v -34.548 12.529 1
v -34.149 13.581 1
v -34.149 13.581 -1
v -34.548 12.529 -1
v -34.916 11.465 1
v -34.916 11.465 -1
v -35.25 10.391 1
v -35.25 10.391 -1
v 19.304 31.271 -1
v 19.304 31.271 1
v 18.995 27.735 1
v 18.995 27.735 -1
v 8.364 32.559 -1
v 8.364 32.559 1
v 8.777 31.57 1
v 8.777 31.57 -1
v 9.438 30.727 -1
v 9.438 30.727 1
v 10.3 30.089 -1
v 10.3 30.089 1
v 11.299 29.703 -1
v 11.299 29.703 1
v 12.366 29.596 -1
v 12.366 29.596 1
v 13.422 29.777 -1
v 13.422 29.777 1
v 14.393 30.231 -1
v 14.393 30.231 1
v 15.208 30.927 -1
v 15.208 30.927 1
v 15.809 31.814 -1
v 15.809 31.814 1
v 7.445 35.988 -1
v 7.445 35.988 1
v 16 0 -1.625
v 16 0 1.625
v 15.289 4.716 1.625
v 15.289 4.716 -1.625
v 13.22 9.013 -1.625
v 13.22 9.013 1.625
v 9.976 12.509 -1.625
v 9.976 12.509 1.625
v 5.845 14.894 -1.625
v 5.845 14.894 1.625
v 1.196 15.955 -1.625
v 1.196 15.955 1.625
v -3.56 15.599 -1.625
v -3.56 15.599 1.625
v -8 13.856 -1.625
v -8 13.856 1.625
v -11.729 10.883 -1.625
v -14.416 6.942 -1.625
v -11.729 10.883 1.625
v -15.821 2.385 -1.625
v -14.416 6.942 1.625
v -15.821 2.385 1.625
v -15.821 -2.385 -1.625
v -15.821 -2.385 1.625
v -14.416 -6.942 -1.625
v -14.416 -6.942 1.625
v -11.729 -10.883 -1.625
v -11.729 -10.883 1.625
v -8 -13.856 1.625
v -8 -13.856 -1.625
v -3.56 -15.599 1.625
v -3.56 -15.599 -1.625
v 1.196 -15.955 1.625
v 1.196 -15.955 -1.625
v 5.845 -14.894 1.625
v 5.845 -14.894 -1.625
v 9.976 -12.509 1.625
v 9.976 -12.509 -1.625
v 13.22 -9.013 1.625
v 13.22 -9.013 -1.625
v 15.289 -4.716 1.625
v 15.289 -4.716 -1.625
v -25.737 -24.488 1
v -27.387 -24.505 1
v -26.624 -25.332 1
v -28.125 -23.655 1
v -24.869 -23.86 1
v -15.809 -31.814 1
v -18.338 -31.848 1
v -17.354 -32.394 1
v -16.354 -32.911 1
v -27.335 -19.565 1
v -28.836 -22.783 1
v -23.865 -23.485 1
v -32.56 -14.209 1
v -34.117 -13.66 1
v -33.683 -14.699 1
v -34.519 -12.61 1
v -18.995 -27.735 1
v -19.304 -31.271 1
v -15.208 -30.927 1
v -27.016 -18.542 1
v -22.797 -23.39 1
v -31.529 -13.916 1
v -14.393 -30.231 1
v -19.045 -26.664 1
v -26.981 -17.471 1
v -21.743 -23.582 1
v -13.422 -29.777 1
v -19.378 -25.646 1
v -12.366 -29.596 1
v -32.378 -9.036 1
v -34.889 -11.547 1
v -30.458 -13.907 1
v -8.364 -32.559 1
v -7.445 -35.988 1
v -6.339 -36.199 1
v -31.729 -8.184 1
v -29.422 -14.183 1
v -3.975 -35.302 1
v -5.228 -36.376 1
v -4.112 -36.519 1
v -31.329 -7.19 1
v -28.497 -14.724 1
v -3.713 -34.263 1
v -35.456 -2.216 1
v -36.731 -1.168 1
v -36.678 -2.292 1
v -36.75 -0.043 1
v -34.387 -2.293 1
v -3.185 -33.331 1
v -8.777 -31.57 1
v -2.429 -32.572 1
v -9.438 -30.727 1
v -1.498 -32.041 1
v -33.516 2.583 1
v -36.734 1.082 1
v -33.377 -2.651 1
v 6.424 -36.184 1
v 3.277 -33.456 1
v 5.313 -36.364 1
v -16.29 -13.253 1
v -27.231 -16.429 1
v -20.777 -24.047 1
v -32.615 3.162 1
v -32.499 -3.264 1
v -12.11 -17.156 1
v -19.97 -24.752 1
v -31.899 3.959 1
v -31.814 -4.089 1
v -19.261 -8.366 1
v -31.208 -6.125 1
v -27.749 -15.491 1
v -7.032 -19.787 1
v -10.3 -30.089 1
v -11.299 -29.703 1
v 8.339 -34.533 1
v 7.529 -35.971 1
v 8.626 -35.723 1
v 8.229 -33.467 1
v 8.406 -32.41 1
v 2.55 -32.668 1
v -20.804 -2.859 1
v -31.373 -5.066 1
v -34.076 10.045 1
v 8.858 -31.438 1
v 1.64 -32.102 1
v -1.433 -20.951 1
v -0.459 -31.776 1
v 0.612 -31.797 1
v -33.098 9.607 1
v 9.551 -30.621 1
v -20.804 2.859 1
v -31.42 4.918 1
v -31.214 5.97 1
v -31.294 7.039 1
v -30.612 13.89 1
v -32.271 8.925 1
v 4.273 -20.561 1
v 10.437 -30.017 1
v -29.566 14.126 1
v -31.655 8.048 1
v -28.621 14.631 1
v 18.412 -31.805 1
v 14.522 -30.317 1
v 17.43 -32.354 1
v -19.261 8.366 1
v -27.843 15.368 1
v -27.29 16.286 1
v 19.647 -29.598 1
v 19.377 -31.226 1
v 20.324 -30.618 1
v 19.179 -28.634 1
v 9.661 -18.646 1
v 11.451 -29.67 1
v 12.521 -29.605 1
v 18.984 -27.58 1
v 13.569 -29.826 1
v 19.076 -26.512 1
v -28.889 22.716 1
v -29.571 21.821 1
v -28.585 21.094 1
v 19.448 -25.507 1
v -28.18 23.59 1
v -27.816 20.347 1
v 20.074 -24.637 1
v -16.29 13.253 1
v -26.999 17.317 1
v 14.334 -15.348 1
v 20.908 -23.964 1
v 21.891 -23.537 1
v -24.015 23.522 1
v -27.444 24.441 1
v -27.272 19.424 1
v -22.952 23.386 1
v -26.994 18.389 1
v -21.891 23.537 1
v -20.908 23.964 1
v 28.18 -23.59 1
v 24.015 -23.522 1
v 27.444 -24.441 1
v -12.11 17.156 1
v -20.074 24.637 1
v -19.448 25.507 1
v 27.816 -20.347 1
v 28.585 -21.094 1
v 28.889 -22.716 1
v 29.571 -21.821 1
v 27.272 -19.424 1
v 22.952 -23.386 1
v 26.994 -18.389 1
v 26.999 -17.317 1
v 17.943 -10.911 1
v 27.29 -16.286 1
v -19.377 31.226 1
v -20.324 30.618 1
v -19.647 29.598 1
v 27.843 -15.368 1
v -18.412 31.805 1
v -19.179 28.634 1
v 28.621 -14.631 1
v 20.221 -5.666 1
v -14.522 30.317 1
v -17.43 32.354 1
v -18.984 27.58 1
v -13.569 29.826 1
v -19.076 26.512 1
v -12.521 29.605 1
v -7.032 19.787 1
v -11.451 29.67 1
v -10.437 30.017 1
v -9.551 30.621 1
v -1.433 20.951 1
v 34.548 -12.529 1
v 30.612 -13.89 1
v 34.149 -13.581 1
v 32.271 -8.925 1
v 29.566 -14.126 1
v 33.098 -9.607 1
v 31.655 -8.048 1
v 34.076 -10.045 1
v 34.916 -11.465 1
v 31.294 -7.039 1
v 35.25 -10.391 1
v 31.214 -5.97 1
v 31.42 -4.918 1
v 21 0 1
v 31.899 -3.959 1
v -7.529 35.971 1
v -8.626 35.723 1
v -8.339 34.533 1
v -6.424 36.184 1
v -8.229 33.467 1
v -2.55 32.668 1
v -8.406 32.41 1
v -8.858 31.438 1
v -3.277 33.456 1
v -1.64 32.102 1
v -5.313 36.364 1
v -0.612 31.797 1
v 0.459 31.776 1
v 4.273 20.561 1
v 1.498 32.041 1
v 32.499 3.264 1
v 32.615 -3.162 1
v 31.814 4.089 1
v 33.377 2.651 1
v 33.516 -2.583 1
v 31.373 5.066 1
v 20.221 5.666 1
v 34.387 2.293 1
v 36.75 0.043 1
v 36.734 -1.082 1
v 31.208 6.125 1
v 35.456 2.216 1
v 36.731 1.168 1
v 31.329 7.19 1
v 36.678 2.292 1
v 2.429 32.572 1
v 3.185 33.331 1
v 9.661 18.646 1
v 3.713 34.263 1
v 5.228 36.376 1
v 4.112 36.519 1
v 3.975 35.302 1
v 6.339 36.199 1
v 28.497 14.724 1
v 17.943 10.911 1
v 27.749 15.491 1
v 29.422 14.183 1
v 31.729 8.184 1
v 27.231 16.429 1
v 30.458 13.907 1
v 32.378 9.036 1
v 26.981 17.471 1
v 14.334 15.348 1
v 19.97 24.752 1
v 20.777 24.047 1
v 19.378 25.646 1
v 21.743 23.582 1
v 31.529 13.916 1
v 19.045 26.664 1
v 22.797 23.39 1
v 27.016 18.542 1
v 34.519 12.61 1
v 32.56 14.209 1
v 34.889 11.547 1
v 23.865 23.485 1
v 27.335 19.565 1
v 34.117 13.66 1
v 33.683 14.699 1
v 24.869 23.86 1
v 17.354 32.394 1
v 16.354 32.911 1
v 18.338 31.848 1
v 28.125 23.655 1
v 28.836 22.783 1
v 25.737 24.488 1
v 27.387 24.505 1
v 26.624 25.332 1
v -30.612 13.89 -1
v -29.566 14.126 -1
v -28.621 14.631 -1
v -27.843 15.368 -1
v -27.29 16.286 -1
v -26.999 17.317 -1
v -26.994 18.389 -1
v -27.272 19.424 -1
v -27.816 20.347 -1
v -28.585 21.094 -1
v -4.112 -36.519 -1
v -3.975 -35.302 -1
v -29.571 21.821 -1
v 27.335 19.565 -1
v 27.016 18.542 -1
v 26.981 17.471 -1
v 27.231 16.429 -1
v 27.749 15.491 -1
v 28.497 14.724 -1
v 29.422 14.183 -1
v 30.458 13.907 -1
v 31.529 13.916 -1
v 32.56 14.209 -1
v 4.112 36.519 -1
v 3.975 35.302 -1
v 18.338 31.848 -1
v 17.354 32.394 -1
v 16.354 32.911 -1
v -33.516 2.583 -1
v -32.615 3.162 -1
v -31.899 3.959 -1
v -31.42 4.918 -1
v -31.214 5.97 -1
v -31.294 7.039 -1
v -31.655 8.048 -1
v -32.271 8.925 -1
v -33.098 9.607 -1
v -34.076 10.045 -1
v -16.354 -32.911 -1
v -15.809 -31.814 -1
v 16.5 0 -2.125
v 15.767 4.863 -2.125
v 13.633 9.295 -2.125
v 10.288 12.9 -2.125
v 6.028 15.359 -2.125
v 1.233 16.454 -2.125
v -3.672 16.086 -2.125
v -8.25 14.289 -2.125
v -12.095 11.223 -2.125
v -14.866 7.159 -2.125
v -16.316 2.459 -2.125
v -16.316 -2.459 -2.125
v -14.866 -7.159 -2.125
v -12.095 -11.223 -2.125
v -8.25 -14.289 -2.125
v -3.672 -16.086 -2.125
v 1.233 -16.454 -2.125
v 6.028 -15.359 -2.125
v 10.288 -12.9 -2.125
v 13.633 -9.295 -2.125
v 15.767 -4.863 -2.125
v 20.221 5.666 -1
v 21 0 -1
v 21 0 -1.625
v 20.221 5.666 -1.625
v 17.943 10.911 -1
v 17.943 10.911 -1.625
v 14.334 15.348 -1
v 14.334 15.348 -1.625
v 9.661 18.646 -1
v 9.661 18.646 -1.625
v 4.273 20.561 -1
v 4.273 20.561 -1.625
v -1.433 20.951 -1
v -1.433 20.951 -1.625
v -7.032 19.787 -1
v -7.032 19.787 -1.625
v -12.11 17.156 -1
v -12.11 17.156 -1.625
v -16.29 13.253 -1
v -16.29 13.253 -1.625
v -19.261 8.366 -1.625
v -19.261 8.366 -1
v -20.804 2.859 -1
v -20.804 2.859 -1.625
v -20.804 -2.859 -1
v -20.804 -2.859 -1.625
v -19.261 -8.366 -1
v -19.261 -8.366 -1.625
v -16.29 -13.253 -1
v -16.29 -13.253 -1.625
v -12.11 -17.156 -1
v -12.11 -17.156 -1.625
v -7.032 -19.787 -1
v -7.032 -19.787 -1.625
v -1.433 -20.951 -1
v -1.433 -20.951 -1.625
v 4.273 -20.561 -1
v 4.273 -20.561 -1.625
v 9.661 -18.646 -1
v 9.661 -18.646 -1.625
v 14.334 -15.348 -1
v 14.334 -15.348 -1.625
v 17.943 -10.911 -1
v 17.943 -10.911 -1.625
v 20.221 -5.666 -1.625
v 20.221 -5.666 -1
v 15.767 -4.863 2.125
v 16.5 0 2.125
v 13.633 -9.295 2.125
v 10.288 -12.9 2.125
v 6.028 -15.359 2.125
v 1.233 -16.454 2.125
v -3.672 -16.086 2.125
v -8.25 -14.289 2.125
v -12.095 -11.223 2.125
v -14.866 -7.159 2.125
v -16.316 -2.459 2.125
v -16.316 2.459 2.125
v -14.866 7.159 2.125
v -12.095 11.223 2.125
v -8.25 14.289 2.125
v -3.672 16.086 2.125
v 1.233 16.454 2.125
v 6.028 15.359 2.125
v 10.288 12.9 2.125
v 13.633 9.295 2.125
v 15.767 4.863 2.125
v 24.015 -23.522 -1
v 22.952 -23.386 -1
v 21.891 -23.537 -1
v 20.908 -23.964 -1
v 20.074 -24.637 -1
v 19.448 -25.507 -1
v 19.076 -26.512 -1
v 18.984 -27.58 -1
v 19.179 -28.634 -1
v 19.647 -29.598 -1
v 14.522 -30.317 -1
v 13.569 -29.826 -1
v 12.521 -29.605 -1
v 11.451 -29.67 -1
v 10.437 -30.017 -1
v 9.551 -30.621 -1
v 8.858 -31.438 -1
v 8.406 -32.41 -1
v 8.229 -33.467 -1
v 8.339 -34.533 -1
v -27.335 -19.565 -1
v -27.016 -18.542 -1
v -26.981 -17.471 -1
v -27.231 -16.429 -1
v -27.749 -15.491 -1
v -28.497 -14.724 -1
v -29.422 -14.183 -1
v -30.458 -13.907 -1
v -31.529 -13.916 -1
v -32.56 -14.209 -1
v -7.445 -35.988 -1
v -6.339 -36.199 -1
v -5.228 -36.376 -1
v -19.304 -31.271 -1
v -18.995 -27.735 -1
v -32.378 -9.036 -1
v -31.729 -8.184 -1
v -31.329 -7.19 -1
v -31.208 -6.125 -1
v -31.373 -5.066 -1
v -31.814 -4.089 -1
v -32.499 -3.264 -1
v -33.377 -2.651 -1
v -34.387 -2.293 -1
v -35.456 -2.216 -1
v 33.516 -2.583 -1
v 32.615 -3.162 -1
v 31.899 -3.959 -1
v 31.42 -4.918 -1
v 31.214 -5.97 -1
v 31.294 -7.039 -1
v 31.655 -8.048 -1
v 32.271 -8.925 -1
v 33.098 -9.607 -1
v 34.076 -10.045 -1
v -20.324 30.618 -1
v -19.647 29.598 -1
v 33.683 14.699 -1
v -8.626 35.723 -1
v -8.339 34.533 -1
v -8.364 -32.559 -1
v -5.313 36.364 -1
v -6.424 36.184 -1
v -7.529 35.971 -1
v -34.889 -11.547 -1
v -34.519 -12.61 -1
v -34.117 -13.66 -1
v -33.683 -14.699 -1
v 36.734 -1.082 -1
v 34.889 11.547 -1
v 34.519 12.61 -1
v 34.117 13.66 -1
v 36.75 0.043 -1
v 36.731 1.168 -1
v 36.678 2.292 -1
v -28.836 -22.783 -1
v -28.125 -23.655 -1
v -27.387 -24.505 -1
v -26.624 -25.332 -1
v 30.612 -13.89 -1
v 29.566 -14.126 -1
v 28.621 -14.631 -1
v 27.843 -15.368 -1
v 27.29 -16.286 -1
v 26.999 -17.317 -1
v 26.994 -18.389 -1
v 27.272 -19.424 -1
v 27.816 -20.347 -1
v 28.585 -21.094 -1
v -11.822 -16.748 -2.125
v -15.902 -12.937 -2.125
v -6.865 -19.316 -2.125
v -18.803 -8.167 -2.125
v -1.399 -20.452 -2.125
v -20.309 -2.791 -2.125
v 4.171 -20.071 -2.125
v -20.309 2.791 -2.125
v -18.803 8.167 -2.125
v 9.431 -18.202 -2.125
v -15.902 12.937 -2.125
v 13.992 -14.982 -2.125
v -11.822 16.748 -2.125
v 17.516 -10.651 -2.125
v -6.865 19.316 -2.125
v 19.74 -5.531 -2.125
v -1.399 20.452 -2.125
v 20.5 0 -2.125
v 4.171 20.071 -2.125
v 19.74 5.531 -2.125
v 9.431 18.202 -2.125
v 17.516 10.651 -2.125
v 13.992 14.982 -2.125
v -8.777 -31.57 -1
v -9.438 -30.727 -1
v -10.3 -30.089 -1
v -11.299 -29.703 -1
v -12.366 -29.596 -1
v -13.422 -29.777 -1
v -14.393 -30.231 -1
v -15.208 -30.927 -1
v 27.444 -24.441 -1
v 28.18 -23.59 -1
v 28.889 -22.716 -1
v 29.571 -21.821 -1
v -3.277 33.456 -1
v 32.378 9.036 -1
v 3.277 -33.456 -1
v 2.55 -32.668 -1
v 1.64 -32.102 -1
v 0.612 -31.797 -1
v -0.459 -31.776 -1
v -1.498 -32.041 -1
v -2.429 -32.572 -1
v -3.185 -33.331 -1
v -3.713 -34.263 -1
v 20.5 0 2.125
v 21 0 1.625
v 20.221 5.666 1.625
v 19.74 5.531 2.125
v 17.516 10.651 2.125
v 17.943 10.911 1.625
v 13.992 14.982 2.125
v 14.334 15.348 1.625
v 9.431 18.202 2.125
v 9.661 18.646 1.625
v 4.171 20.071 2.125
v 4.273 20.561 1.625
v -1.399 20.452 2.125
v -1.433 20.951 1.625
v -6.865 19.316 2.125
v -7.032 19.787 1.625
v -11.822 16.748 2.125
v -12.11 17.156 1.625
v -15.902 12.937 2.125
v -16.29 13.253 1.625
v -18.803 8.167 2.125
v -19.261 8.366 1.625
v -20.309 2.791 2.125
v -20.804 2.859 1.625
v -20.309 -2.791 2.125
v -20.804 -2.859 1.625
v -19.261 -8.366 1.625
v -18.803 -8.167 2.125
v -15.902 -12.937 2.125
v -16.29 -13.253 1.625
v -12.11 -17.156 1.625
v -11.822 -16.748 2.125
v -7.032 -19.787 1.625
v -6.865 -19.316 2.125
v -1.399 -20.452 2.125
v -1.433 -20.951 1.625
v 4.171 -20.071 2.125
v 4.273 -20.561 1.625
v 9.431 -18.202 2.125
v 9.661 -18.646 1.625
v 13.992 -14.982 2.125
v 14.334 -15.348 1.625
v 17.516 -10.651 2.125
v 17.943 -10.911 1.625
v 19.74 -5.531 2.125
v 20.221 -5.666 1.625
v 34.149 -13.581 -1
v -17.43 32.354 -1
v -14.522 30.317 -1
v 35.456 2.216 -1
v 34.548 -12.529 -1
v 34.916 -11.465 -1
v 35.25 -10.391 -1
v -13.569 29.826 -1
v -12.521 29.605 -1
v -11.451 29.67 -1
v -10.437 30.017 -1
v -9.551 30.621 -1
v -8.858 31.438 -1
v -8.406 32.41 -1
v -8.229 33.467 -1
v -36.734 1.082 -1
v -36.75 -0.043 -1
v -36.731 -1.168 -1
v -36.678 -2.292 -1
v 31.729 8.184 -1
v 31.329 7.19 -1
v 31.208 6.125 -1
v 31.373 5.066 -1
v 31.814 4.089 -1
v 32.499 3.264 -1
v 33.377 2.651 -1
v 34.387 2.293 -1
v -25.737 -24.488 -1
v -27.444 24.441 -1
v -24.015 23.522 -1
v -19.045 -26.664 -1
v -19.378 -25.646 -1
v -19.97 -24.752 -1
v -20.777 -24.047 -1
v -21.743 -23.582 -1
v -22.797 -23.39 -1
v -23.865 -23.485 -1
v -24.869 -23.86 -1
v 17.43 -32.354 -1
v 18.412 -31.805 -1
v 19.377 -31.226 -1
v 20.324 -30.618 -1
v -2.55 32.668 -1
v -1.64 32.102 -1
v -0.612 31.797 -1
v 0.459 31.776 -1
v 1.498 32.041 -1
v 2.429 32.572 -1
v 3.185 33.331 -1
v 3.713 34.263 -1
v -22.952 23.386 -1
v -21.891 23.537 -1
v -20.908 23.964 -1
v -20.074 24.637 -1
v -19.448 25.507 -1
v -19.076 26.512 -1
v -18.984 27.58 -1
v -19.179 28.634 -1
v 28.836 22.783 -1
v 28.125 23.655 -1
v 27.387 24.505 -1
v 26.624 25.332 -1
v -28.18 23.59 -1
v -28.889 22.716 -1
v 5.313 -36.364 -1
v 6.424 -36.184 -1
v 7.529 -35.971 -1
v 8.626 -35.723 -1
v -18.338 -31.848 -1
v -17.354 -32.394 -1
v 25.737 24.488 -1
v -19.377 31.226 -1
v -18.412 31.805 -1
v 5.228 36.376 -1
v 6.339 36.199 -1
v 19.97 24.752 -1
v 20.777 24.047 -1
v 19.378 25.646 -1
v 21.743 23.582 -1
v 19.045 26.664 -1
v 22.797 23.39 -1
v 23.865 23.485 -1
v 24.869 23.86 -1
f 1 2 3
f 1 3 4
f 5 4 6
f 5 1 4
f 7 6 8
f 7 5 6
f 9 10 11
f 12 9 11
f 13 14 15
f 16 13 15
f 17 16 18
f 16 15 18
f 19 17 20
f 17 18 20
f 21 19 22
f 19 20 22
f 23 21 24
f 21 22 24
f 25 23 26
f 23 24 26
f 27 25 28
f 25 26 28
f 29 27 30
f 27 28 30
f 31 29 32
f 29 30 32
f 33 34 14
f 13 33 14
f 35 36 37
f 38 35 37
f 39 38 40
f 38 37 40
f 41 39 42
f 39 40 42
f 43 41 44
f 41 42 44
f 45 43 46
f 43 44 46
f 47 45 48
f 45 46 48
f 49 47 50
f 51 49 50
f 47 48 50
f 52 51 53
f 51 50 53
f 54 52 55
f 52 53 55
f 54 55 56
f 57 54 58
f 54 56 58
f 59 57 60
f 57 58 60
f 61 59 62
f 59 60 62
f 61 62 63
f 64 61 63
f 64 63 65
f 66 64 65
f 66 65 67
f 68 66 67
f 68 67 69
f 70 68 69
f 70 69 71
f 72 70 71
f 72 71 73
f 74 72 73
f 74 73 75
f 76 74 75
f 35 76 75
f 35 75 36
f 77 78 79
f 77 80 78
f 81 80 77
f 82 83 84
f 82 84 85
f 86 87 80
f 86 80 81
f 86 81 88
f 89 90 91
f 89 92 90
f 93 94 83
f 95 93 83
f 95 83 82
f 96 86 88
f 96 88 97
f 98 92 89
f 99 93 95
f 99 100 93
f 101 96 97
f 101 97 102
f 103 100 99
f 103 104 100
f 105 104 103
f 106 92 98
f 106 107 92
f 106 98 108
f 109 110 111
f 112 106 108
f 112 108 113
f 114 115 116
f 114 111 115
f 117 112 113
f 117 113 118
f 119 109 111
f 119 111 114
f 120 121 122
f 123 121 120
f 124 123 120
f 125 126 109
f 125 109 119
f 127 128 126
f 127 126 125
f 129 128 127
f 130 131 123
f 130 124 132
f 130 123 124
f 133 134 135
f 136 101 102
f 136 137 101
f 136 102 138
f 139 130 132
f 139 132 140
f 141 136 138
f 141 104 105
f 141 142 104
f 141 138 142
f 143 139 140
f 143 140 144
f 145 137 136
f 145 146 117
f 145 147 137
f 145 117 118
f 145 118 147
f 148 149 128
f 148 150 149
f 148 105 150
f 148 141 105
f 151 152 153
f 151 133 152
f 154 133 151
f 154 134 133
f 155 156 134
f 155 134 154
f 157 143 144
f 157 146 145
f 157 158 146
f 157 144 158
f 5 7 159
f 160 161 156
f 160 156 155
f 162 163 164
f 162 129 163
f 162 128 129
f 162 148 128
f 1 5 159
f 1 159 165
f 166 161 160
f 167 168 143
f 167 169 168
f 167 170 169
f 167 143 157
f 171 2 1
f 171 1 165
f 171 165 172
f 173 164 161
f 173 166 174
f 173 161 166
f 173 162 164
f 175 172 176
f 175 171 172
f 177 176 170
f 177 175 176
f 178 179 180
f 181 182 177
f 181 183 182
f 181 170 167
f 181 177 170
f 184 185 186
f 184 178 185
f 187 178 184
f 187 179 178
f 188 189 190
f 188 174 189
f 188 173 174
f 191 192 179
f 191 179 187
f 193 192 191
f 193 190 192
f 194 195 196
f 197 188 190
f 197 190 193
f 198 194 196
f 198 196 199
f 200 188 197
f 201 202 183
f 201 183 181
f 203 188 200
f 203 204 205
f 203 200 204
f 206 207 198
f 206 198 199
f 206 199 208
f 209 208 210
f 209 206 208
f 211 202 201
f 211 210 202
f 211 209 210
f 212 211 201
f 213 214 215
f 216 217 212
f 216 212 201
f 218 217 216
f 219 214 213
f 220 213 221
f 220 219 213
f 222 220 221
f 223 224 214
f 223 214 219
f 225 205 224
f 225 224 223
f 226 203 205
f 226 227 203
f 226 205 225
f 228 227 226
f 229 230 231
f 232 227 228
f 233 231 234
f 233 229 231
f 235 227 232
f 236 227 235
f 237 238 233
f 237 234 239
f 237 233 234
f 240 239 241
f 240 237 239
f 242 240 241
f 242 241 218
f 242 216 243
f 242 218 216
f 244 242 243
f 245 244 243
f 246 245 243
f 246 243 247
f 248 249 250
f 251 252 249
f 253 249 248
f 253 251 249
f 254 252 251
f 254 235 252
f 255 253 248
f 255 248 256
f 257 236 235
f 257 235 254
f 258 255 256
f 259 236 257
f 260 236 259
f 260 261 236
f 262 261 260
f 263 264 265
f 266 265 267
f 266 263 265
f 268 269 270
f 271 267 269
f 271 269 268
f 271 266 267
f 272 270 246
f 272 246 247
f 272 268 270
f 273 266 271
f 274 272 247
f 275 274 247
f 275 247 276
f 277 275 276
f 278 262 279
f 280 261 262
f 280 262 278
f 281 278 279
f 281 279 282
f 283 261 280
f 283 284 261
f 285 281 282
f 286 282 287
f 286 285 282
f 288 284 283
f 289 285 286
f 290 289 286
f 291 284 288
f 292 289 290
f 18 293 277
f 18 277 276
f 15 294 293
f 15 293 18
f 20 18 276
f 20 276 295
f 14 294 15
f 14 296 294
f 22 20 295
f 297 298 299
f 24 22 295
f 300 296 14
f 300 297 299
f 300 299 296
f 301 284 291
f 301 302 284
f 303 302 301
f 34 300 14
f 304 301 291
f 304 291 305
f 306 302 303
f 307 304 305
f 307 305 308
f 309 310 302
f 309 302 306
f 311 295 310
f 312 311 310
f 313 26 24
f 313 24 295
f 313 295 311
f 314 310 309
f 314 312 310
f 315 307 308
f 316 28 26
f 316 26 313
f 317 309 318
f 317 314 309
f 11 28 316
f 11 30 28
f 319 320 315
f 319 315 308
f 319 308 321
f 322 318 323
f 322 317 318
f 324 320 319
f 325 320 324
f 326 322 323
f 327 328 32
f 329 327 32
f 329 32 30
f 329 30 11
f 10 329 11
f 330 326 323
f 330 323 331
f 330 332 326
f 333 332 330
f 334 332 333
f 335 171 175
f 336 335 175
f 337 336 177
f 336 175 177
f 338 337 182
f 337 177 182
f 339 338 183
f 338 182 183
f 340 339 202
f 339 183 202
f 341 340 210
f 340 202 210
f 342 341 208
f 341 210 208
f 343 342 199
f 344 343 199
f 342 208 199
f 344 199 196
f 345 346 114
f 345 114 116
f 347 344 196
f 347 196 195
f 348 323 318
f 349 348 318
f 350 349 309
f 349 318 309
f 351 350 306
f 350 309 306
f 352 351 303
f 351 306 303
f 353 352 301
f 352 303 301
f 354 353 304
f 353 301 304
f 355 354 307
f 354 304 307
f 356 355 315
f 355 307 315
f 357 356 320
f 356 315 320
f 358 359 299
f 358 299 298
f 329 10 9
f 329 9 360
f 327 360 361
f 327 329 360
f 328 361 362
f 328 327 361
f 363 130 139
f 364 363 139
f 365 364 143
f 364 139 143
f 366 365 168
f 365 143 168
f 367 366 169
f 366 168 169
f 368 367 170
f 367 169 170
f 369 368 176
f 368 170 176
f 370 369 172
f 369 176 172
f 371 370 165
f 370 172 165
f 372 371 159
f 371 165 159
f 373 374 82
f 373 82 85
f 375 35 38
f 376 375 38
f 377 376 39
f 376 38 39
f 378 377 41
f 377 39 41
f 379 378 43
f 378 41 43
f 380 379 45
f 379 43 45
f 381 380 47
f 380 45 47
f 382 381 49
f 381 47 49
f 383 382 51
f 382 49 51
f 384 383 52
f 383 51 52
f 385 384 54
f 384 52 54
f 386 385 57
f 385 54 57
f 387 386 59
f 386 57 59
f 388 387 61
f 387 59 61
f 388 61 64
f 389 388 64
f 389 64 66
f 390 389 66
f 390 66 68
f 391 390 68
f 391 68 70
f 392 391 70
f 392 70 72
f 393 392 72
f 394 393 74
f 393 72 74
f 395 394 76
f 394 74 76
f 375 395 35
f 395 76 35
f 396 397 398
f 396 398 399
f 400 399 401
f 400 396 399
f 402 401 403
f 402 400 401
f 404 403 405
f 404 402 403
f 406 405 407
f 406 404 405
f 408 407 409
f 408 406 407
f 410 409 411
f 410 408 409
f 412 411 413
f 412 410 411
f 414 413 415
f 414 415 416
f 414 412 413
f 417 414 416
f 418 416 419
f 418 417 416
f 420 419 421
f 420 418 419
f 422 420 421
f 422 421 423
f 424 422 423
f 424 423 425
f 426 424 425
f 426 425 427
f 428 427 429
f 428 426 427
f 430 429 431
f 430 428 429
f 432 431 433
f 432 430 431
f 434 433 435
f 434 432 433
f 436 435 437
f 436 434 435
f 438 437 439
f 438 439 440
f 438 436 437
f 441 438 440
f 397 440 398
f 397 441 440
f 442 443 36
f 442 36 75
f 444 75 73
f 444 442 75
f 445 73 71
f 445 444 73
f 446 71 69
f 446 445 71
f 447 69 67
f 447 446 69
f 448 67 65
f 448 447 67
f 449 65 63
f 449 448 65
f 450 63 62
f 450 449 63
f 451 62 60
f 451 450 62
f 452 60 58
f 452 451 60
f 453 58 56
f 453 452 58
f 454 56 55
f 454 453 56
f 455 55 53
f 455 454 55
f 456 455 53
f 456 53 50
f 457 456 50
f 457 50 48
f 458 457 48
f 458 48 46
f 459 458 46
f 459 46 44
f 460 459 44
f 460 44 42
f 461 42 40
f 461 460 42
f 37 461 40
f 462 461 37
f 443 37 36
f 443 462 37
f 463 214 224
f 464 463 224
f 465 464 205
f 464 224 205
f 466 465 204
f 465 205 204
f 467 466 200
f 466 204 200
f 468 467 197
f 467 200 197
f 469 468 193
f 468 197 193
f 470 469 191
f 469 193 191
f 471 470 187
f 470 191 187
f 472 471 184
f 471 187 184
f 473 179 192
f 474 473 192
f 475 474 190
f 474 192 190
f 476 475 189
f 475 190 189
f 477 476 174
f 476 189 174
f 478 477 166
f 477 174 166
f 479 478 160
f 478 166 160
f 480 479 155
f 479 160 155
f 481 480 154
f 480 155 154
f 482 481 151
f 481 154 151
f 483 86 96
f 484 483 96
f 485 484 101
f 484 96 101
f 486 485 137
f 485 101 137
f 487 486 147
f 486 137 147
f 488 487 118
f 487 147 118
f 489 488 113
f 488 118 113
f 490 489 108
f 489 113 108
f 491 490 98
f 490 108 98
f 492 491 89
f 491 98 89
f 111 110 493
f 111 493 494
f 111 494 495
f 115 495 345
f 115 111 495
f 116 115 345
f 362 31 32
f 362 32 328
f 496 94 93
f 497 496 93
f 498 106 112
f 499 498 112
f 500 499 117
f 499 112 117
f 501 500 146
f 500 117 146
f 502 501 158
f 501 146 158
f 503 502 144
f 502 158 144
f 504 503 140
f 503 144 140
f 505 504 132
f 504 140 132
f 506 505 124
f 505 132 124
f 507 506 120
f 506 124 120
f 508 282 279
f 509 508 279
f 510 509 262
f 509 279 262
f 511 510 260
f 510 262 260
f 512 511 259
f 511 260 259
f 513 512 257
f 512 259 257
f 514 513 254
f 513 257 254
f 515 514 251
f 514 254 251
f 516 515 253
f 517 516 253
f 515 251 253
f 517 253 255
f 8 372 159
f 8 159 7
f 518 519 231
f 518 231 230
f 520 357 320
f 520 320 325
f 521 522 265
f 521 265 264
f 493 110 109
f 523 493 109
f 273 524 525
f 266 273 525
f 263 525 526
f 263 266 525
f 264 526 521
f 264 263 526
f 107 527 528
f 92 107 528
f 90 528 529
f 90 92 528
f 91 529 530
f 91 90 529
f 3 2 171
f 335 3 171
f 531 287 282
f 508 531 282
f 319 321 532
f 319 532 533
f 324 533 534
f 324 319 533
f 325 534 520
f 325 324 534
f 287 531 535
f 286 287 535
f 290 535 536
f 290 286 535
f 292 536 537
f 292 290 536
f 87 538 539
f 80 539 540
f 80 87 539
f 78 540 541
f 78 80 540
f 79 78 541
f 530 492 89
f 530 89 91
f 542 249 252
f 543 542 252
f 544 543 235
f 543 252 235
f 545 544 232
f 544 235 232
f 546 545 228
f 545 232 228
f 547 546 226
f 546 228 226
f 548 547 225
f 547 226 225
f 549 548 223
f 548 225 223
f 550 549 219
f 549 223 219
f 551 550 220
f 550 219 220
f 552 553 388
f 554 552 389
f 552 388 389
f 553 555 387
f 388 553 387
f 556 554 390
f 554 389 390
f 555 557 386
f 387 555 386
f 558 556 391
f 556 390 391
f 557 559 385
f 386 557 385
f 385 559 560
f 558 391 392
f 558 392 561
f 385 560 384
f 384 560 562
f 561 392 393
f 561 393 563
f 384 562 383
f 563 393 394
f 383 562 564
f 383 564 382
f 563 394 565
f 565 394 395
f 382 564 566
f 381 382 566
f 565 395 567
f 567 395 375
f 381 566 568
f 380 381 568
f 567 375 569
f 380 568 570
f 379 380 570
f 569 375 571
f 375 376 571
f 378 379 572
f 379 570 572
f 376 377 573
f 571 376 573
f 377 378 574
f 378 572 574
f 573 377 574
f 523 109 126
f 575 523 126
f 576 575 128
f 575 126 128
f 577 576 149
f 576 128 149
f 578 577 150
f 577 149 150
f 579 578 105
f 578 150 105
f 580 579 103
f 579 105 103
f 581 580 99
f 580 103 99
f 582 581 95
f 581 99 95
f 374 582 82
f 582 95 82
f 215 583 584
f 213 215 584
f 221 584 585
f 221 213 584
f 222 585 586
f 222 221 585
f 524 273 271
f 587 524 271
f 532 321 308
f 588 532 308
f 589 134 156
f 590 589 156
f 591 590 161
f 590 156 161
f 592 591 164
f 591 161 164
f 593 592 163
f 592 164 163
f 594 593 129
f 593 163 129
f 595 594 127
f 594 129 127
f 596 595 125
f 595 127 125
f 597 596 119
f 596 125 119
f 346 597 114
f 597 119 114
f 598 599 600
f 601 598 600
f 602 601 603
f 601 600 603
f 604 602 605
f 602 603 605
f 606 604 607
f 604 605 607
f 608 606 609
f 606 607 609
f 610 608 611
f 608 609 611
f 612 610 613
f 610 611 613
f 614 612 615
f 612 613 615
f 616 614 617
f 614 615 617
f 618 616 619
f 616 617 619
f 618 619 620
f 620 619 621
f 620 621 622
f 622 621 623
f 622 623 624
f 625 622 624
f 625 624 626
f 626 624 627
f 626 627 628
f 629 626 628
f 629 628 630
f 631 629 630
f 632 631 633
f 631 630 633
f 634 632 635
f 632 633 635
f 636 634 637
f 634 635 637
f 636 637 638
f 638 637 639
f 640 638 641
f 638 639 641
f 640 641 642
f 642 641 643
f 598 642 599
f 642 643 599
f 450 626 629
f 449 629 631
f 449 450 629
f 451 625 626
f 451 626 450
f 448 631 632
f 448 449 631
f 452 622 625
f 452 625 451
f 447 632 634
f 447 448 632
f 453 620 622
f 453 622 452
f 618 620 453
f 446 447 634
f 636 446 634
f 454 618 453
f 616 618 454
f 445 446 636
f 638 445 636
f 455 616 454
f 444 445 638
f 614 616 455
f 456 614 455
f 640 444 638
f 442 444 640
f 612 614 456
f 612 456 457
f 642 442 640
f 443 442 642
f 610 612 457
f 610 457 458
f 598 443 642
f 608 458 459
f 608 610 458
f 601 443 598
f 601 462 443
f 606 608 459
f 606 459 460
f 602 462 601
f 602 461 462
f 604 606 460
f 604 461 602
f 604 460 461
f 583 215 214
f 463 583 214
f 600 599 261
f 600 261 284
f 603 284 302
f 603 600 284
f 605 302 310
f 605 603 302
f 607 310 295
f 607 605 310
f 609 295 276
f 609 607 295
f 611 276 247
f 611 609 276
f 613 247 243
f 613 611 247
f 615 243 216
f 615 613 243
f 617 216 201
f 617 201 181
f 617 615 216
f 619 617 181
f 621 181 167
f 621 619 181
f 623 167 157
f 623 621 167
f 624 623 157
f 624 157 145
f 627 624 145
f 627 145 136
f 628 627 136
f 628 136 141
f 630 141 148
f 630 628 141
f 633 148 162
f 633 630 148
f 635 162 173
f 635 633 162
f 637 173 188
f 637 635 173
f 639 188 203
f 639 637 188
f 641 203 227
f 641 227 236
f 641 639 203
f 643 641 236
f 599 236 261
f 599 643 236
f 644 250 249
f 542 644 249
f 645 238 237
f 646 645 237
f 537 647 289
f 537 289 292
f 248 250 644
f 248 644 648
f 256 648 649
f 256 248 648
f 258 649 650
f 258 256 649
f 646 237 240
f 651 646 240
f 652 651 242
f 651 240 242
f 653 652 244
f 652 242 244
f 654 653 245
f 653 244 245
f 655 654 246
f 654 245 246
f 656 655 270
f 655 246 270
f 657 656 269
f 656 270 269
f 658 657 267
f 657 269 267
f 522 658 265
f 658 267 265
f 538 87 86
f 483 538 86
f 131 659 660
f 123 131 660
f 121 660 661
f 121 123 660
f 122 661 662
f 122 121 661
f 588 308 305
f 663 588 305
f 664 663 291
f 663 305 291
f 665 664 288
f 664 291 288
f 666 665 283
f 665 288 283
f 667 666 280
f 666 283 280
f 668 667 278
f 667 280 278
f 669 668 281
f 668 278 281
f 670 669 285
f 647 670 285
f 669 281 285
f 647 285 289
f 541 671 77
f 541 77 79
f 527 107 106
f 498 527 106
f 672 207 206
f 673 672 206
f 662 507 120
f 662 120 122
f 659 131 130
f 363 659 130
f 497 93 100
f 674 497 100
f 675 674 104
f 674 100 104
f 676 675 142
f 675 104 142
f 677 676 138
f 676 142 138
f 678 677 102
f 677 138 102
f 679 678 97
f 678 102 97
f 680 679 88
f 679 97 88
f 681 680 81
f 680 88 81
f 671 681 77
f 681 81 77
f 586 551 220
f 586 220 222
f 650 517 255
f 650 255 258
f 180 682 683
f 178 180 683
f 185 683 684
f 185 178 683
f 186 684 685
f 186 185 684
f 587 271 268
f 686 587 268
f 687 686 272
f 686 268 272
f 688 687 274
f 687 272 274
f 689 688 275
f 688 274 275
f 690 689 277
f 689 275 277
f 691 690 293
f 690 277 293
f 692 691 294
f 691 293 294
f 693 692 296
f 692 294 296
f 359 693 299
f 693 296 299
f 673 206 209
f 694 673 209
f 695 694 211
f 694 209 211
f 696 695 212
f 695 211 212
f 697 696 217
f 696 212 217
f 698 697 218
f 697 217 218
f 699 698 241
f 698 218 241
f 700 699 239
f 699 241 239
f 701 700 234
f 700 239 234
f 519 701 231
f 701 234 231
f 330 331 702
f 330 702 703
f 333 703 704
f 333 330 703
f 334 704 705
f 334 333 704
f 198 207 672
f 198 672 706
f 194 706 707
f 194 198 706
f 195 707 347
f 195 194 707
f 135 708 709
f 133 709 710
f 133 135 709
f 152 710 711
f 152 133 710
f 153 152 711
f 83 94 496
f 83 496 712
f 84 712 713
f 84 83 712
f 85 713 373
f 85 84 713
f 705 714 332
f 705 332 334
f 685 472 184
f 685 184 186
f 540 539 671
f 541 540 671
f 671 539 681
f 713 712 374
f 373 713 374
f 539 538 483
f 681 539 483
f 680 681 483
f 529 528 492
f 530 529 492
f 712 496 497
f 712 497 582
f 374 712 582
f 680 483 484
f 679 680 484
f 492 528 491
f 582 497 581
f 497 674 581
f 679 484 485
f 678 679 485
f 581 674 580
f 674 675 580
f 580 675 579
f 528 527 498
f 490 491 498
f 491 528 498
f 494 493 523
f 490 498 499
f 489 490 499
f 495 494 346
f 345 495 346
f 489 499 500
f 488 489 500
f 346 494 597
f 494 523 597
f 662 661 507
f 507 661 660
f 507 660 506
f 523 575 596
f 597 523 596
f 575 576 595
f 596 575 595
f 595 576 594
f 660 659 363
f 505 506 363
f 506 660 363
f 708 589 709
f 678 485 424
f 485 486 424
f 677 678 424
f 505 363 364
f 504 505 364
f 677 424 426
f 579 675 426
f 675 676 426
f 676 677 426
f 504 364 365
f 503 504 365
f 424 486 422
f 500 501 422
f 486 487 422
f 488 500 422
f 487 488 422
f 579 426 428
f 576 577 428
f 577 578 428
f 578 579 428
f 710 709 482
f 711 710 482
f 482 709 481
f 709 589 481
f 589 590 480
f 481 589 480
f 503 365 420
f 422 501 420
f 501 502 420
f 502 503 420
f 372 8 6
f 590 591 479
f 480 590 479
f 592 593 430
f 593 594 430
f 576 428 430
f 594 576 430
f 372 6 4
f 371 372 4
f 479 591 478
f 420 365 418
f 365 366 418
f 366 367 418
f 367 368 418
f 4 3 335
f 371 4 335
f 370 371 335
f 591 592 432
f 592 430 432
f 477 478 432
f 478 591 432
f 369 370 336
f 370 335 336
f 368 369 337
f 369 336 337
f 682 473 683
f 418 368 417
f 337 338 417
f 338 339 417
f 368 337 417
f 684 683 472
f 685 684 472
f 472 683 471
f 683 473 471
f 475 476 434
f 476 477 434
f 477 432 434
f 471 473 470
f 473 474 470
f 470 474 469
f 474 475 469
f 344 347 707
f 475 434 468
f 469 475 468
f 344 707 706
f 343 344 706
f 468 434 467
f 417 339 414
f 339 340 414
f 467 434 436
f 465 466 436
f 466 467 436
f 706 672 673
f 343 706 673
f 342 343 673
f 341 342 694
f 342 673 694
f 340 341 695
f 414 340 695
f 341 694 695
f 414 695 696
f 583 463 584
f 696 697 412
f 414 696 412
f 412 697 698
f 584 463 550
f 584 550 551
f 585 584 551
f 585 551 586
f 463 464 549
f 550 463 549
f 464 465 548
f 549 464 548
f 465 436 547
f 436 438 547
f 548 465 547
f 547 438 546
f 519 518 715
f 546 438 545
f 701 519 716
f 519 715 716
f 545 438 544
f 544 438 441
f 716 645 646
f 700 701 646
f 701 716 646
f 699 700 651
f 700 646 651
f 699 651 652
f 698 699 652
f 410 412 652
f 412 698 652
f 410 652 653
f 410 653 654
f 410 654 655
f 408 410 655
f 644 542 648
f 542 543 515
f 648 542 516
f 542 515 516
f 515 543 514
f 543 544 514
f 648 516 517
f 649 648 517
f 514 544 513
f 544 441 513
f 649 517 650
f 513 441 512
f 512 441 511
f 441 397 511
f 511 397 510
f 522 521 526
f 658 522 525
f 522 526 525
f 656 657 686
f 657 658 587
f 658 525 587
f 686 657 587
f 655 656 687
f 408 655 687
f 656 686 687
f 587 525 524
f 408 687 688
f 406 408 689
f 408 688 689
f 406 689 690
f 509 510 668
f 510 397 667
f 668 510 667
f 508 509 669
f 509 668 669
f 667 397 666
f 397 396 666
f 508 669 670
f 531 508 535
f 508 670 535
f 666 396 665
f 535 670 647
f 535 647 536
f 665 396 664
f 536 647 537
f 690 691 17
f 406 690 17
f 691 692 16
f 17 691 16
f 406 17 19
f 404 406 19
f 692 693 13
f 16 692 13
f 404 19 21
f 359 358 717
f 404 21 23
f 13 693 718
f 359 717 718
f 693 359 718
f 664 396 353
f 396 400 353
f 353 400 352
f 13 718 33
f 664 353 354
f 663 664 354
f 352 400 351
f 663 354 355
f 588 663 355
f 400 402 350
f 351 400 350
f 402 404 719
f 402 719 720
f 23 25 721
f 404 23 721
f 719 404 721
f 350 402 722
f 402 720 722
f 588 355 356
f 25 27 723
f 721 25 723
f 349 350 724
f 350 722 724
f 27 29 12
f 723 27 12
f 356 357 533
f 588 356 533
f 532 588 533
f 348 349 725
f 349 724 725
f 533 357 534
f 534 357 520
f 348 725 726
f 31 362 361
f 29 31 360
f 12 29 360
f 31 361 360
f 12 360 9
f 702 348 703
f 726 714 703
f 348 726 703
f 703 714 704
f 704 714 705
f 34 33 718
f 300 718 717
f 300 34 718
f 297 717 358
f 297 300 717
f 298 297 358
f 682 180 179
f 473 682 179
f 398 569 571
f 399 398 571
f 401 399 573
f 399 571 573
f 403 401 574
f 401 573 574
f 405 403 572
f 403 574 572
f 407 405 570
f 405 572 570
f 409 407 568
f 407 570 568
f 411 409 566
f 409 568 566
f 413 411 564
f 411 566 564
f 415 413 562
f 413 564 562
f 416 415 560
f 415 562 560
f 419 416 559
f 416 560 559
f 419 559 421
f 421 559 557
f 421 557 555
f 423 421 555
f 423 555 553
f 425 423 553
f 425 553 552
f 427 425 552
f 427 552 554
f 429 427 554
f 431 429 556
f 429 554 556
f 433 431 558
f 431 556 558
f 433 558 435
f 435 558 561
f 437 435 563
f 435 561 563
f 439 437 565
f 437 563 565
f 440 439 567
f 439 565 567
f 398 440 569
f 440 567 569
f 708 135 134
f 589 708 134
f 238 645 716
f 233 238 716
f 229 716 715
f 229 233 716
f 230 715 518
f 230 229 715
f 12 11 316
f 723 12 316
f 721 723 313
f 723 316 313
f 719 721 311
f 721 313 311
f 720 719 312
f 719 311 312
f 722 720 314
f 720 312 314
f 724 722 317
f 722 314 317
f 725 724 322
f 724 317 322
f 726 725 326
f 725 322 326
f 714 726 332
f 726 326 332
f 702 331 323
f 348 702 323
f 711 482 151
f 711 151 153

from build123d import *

# Parameters (mm, degrees)
ESQUISSE1_R                  = 36.75
EXTRUSION1_DEPTH             = 1
ENL_V_MAT_EXTRU_1_DEPTH      = 2
R_P_TITION_CIRCULAIRE1_COUNT = 18
ESQUISSE3_R                  = 21
EXTRUSION2_DEPTH             = 2.125
ESQUISSE4_R                  = 16
ENL_V_MAT_EXTRU_2_DEPTH      = 3.125
ENL_V_MAT_EXTRU_2_DEPTH_BACK = 3.125
CHANFREIN1_SIZE              = 0.5


with BuildPart() as part:
    # Esquisse1 → Extrusion1 (new body, symmetric)
    with BuildSketch(Plane.XY):
        Circle(ESQUISSE1_R)
    extrude(amount=EXTRUSION1_DEPTH, both=True)

    # Esquisse2 → Enlèv. mat.-Extru.1 (cut, symmetric)
    with BuildSketch(Plane.XY):
        with BuildLine():
            Line((-5.312971291, 36.363922177), (-3.276608177, 33.455694255))
            ThreePointArc((-3.276608177, 33.455694255), (0.987178532, 31.873728783), (3.974883244, 35.302447552))
            Line((3.974883244, 35.302447552), (4.111888112, 36.519239808))
            ThreePointArc((4.111888112, 36.519239808), (-0.605541982, 36.745010803), (-5.312971291, 36.363922177))
        make_face()
    enl_v_mat_extru_1 = extrude(amount=ENL_V_MAT_EXTRU_1_DEPTH, both=True, mode=Mode.SUBTRACT)

    # Répétition circulaire1: Enlèv. mat.-Extru.1 ×18 about axis
    r_p_tition_circulaire1_axis = Axis((0, 0, 0), (0, 0, 1))
    for i in range(1, R_P_TITION_CIRCULAIRE1_COUNT):
        add(enl_v_mat_extru_1.rotate(r_p_tition_circulaire1_axis, i * 360 / R_P_TITION_CIRCULAIRE1_COUNT), mode=Mode.SUBTRACT)

    # Esquisse3 → Extrusion2 (add, symmetric)
    with BuildSketch(Plane.XY):
        Circle(ESQUISSE3_R)
    extrude(amount=EXTRUSION2_DEPTH, both=True)

    # Esquisse4 → Enlèv. mat.-Extru.2 (cut, two sides)
    with BuildSketch(Plane.XY) as enl_v_mat_extru_2_sk:
        Circle(ESQUISSE4_R)
    extrude(amount=ENL_V_MAT_EXTRU_2_DEPTH, mode=Mode.SUBTRACT)
    extrude(enl_v_mat_extru_2_sk.sketch, amount=-ENL_V_MAT_EXTRU_2_DEPTH_BACK, mode=Mode.SUBTRACT)

    # Chanfrein1
    chanfrein1_edges = [part.edges().sort_by_distance(p)[0] for p in [
        (-21, 0, -2.125),
        (-21, 0, 2.125),
        (-16, 0, -2.125),
        (-16, 0, 2.125),
    ]]
    chamfer(chanfrein1_edges, length=CHANFREIN1_SIZE)


solid = part.part
